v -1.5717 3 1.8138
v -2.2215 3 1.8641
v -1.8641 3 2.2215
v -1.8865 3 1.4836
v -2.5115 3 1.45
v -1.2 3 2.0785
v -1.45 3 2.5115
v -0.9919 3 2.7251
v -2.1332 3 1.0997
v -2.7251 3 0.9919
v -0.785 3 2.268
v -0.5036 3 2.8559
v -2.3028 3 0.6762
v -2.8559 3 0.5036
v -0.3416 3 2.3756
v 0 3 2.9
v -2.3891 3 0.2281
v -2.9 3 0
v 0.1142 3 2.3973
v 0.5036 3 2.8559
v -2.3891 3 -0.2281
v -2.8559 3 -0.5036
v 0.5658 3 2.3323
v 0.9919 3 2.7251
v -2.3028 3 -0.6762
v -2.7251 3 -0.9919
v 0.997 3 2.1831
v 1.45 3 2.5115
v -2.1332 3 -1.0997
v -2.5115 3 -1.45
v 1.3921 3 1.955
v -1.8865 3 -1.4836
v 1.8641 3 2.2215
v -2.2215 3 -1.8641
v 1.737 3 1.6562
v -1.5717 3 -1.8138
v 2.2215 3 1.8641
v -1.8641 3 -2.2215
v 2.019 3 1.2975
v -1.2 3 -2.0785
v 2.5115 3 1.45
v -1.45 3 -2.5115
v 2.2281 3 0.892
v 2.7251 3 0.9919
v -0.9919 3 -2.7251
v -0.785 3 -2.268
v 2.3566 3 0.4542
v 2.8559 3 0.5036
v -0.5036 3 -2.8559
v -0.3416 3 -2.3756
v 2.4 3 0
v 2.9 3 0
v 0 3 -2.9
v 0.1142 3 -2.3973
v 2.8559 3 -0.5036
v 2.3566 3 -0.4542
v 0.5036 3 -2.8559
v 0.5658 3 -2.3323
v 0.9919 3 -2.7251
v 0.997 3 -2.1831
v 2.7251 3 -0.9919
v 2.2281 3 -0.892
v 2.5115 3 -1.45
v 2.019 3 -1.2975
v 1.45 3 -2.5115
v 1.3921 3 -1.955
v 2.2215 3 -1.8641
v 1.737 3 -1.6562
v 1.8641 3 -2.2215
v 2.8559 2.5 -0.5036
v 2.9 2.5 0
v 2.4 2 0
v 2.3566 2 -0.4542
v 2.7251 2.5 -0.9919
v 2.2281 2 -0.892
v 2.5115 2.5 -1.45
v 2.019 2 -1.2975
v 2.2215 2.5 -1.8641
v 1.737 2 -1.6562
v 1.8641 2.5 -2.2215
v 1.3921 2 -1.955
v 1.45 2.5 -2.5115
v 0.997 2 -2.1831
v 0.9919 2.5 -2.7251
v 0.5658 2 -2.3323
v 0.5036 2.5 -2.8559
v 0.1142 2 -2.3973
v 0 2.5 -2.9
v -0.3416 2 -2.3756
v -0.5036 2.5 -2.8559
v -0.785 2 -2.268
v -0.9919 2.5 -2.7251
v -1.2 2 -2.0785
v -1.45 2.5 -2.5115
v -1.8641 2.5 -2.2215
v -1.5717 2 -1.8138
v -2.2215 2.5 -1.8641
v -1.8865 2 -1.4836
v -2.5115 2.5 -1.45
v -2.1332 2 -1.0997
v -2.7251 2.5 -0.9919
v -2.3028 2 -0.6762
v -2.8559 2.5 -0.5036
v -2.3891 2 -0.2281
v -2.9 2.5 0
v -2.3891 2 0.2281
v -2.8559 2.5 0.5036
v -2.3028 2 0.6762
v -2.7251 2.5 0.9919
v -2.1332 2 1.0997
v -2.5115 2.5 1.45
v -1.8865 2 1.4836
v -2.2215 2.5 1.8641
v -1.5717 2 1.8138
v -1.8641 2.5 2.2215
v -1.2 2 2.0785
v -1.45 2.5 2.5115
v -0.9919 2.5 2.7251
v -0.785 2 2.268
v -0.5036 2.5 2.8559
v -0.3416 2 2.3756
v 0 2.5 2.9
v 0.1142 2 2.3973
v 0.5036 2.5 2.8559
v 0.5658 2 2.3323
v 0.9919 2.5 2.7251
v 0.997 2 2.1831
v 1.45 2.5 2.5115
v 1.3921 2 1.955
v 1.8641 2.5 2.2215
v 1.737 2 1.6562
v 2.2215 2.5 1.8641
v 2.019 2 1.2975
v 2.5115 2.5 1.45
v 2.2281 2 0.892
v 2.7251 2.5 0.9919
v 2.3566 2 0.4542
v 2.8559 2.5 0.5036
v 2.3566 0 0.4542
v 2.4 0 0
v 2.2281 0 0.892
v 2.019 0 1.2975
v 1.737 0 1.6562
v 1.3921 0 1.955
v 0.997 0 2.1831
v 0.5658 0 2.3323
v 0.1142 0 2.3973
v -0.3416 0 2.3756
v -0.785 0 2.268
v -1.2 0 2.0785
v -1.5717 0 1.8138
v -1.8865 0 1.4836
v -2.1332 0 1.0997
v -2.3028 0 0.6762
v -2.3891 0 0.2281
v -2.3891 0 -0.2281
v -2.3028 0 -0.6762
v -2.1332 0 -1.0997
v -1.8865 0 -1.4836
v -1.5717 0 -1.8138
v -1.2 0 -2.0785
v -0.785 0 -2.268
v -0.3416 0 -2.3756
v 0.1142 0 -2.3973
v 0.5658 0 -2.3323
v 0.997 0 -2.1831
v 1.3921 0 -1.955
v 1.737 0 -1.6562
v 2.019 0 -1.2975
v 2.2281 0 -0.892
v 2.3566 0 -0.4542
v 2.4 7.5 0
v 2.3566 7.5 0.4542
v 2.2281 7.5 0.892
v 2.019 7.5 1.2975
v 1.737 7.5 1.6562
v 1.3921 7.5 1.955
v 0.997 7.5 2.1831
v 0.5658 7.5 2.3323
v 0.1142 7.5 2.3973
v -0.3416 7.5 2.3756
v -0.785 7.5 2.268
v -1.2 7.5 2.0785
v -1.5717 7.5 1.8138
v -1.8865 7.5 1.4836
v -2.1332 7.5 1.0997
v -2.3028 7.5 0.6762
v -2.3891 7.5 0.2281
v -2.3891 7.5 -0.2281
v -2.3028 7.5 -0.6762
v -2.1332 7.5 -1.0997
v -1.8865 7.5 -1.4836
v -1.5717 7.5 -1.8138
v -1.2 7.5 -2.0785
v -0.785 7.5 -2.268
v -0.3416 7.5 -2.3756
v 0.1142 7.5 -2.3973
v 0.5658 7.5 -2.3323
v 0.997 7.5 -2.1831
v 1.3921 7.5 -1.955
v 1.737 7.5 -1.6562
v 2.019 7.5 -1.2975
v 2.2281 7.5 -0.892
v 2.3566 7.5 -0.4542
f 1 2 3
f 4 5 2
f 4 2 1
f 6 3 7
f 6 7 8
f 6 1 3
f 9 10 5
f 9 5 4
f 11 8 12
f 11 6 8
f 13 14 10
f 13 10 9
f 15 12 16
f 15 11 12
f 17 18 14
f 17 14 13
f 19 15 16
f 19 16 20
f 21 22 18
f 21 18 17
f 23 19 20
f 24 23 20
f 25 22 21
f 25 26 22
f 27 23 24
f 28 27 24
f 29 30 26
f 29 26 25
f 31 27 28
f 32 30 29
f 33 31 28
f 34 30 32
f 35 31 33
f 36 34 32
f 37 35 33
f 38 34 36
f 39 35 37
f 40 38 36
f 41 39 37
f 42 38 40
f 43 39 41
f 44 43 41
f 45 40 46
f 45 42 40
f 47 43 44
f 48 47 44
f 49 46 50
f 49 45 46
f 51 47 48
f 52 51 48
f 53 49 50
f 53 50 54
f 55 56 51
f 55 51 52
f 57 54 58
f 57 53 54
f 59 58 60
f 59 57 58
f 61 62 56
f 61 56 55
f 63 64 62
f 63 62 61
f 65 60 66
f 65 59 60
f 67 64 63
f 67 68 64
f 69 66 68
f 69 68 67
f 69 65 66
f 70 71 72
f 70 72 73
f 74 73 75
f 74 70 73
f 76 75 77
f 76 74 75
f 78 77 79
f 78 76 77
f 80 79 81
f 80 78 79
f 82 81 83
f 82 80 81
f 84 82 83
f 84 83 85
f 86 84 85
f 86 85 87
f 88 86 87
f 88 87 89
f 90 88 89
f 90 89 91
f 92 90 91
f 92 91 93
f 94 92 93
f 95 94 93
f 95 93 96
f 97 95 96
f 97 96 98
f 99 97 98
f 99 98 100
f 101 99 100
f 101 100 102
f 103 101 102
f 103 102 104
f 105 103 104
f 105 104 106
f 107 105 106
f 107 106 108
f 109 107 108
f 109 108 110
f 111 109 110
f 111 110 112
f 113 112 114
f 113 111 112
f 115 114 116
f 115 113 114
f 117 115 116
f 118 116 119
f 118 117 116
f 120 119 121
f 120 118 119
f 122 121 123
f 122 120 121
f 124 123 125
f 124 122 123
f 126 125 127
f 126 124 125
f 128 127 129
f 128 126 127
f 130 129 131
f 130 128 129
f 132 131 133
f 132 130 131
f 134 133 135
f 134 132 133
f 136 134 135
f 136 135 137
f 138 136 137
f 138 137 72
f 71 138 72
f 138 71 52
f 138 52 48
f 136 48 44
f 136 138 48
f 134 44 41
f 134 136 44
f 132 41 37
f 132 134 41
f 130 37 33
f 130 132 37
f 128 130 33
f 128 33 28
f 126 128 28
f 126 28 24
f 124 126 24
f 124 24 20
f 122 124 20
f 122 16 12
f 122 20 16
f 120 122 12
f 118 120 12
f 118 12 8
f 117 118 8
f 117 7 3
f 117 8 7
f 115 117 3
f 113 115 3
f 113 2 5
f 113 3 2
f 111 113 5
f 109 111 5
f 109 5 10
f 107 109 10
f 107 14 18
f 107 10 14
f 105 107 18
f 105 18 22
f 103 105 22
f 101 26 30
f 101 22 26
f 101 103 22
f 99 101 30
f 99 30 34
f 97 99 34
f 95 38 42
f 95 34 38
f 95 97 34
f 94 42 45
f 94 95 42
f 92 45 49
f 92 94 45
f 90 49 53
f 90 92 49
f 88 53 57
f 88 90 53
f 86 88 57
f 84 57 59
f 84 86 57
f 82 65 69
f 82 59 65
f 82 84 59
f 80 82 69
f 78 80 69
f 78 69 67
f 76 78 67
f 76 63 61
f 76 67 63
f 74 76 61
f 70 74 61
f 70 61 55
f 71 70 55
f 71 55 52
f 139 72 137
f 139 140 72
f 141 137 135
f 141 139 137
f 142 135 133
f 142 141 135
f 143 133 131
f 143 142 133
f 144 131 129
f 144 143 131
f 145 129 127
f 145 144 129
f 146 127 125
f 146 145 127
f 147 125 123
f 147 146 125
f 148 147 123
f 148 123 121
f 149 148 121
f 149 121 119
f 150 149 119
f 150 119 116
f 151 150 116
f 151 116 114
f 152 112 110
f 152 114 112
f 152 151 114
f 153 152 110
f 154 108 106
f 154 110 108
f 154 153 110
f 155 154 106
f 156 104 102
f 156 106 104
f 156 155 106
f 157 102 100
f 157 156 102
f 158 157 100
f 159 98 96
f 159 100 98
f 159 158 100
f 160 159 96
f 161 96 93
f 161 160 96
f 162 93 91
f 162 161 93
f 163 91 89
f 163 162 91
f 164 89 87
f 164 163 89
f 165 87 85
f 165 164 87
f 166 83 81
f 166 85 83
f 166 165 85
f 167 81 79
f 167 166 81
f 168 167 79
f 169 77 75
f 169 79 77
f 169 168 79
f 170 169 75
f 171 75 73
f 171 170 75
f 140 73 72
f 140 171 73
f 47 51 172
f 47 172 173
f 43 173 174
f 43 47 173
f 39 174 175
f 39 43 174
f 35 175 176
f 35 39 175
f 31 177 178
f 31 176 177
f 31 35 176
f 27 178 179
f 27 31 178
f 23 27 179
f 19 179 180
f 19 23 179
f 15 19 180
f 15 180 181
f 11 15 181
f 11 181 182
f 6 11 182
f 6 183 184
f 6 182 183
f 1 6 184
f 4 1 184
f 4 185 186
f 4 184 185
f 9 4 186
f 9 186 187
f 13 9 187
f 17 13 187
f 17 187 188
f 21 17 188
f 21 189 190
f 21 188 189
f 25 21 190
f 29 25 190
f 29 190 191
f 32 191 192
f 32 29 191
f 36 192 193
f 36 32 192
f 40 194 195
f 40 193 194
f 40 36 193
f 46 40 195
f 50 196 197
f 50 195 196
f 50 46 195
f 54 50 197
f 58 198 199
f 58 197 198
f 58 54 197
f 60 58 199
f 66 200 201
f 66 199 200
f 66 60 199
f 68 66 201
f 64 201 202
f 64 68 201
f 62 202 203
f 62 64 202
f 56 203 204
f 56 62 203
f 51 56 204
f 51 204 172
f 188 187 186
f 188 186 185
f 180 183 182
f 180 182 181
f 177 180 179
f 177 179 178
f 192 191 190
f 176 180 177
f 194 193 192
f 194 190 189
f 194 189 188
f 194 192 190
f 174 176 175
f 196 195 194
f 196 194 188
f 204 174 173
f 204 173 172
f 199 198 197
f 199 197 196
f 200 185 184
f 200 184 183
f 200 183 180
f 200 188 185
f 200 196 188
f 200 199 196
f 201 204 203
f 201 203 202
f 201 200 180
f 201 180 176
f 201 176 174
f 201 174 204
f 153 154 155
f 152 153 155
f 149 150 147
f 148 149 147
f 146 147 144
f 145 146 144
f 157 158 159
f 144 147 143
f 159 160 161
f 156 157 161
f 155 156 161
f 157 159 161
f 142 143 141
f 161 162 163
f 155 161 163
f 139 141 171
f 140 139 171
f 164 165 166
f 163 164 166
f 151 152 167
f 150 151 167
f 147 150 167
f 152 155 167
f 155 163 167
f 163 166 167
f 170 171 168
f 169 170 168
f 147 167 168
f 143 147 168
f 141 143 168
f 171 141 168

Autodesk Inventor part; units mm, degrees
ref_plane "YZ Plane" through (0, 0, 0) normal (1, 0, 0) x (0, 1, 0)
ref_plane "XZ Plane" through (0, 0, 0) normal (0, 1, 0) x (-1, 0, 0)
ref_plane "XY Plane" through (0, 0, 0) normal (0, 0, 1) x (1, 0, 0)
sketch "Sketch1" plane through (0, 0, 0) normal (0, 0, 1) x (1, 0, 0)
  line L0 (0, 0) -> (0, 7.5)
  line L1 (0, 7.5) -> (2.4, 7.5)
  line L2 (2.4, 7.5) -> (2.4, 3)
  line L3 (2.4, 3) -> (2.9, 3)
  line L4 (2.9, 2) -> (2.4, 2) construction
  line L5 (2.4, 2) -> (2.4, 0)
  line L6 (2.4, 0) -> (0, 0)
  line L7 (2.4, 2) -> (2.9, 2.5)
  line L8 (2.9, 3) -> (2.9, 2.5)
  line L9 (2.9, 2.5) -> (2.9, 2) construction
  dimension "d0" = 2.4
  dimension "d1" = 2
  dimension "d2" = 1
  dimension "d3" = 4.5
  dimension "d7" = 45
  dimension "d8" = 0.5
revolve "Revolution1" add sketch "Sketch1" angle 360 about axis through (0, 0, 0) along (0, 1, 0)
properties part number "Stepper Shaft Extension"
